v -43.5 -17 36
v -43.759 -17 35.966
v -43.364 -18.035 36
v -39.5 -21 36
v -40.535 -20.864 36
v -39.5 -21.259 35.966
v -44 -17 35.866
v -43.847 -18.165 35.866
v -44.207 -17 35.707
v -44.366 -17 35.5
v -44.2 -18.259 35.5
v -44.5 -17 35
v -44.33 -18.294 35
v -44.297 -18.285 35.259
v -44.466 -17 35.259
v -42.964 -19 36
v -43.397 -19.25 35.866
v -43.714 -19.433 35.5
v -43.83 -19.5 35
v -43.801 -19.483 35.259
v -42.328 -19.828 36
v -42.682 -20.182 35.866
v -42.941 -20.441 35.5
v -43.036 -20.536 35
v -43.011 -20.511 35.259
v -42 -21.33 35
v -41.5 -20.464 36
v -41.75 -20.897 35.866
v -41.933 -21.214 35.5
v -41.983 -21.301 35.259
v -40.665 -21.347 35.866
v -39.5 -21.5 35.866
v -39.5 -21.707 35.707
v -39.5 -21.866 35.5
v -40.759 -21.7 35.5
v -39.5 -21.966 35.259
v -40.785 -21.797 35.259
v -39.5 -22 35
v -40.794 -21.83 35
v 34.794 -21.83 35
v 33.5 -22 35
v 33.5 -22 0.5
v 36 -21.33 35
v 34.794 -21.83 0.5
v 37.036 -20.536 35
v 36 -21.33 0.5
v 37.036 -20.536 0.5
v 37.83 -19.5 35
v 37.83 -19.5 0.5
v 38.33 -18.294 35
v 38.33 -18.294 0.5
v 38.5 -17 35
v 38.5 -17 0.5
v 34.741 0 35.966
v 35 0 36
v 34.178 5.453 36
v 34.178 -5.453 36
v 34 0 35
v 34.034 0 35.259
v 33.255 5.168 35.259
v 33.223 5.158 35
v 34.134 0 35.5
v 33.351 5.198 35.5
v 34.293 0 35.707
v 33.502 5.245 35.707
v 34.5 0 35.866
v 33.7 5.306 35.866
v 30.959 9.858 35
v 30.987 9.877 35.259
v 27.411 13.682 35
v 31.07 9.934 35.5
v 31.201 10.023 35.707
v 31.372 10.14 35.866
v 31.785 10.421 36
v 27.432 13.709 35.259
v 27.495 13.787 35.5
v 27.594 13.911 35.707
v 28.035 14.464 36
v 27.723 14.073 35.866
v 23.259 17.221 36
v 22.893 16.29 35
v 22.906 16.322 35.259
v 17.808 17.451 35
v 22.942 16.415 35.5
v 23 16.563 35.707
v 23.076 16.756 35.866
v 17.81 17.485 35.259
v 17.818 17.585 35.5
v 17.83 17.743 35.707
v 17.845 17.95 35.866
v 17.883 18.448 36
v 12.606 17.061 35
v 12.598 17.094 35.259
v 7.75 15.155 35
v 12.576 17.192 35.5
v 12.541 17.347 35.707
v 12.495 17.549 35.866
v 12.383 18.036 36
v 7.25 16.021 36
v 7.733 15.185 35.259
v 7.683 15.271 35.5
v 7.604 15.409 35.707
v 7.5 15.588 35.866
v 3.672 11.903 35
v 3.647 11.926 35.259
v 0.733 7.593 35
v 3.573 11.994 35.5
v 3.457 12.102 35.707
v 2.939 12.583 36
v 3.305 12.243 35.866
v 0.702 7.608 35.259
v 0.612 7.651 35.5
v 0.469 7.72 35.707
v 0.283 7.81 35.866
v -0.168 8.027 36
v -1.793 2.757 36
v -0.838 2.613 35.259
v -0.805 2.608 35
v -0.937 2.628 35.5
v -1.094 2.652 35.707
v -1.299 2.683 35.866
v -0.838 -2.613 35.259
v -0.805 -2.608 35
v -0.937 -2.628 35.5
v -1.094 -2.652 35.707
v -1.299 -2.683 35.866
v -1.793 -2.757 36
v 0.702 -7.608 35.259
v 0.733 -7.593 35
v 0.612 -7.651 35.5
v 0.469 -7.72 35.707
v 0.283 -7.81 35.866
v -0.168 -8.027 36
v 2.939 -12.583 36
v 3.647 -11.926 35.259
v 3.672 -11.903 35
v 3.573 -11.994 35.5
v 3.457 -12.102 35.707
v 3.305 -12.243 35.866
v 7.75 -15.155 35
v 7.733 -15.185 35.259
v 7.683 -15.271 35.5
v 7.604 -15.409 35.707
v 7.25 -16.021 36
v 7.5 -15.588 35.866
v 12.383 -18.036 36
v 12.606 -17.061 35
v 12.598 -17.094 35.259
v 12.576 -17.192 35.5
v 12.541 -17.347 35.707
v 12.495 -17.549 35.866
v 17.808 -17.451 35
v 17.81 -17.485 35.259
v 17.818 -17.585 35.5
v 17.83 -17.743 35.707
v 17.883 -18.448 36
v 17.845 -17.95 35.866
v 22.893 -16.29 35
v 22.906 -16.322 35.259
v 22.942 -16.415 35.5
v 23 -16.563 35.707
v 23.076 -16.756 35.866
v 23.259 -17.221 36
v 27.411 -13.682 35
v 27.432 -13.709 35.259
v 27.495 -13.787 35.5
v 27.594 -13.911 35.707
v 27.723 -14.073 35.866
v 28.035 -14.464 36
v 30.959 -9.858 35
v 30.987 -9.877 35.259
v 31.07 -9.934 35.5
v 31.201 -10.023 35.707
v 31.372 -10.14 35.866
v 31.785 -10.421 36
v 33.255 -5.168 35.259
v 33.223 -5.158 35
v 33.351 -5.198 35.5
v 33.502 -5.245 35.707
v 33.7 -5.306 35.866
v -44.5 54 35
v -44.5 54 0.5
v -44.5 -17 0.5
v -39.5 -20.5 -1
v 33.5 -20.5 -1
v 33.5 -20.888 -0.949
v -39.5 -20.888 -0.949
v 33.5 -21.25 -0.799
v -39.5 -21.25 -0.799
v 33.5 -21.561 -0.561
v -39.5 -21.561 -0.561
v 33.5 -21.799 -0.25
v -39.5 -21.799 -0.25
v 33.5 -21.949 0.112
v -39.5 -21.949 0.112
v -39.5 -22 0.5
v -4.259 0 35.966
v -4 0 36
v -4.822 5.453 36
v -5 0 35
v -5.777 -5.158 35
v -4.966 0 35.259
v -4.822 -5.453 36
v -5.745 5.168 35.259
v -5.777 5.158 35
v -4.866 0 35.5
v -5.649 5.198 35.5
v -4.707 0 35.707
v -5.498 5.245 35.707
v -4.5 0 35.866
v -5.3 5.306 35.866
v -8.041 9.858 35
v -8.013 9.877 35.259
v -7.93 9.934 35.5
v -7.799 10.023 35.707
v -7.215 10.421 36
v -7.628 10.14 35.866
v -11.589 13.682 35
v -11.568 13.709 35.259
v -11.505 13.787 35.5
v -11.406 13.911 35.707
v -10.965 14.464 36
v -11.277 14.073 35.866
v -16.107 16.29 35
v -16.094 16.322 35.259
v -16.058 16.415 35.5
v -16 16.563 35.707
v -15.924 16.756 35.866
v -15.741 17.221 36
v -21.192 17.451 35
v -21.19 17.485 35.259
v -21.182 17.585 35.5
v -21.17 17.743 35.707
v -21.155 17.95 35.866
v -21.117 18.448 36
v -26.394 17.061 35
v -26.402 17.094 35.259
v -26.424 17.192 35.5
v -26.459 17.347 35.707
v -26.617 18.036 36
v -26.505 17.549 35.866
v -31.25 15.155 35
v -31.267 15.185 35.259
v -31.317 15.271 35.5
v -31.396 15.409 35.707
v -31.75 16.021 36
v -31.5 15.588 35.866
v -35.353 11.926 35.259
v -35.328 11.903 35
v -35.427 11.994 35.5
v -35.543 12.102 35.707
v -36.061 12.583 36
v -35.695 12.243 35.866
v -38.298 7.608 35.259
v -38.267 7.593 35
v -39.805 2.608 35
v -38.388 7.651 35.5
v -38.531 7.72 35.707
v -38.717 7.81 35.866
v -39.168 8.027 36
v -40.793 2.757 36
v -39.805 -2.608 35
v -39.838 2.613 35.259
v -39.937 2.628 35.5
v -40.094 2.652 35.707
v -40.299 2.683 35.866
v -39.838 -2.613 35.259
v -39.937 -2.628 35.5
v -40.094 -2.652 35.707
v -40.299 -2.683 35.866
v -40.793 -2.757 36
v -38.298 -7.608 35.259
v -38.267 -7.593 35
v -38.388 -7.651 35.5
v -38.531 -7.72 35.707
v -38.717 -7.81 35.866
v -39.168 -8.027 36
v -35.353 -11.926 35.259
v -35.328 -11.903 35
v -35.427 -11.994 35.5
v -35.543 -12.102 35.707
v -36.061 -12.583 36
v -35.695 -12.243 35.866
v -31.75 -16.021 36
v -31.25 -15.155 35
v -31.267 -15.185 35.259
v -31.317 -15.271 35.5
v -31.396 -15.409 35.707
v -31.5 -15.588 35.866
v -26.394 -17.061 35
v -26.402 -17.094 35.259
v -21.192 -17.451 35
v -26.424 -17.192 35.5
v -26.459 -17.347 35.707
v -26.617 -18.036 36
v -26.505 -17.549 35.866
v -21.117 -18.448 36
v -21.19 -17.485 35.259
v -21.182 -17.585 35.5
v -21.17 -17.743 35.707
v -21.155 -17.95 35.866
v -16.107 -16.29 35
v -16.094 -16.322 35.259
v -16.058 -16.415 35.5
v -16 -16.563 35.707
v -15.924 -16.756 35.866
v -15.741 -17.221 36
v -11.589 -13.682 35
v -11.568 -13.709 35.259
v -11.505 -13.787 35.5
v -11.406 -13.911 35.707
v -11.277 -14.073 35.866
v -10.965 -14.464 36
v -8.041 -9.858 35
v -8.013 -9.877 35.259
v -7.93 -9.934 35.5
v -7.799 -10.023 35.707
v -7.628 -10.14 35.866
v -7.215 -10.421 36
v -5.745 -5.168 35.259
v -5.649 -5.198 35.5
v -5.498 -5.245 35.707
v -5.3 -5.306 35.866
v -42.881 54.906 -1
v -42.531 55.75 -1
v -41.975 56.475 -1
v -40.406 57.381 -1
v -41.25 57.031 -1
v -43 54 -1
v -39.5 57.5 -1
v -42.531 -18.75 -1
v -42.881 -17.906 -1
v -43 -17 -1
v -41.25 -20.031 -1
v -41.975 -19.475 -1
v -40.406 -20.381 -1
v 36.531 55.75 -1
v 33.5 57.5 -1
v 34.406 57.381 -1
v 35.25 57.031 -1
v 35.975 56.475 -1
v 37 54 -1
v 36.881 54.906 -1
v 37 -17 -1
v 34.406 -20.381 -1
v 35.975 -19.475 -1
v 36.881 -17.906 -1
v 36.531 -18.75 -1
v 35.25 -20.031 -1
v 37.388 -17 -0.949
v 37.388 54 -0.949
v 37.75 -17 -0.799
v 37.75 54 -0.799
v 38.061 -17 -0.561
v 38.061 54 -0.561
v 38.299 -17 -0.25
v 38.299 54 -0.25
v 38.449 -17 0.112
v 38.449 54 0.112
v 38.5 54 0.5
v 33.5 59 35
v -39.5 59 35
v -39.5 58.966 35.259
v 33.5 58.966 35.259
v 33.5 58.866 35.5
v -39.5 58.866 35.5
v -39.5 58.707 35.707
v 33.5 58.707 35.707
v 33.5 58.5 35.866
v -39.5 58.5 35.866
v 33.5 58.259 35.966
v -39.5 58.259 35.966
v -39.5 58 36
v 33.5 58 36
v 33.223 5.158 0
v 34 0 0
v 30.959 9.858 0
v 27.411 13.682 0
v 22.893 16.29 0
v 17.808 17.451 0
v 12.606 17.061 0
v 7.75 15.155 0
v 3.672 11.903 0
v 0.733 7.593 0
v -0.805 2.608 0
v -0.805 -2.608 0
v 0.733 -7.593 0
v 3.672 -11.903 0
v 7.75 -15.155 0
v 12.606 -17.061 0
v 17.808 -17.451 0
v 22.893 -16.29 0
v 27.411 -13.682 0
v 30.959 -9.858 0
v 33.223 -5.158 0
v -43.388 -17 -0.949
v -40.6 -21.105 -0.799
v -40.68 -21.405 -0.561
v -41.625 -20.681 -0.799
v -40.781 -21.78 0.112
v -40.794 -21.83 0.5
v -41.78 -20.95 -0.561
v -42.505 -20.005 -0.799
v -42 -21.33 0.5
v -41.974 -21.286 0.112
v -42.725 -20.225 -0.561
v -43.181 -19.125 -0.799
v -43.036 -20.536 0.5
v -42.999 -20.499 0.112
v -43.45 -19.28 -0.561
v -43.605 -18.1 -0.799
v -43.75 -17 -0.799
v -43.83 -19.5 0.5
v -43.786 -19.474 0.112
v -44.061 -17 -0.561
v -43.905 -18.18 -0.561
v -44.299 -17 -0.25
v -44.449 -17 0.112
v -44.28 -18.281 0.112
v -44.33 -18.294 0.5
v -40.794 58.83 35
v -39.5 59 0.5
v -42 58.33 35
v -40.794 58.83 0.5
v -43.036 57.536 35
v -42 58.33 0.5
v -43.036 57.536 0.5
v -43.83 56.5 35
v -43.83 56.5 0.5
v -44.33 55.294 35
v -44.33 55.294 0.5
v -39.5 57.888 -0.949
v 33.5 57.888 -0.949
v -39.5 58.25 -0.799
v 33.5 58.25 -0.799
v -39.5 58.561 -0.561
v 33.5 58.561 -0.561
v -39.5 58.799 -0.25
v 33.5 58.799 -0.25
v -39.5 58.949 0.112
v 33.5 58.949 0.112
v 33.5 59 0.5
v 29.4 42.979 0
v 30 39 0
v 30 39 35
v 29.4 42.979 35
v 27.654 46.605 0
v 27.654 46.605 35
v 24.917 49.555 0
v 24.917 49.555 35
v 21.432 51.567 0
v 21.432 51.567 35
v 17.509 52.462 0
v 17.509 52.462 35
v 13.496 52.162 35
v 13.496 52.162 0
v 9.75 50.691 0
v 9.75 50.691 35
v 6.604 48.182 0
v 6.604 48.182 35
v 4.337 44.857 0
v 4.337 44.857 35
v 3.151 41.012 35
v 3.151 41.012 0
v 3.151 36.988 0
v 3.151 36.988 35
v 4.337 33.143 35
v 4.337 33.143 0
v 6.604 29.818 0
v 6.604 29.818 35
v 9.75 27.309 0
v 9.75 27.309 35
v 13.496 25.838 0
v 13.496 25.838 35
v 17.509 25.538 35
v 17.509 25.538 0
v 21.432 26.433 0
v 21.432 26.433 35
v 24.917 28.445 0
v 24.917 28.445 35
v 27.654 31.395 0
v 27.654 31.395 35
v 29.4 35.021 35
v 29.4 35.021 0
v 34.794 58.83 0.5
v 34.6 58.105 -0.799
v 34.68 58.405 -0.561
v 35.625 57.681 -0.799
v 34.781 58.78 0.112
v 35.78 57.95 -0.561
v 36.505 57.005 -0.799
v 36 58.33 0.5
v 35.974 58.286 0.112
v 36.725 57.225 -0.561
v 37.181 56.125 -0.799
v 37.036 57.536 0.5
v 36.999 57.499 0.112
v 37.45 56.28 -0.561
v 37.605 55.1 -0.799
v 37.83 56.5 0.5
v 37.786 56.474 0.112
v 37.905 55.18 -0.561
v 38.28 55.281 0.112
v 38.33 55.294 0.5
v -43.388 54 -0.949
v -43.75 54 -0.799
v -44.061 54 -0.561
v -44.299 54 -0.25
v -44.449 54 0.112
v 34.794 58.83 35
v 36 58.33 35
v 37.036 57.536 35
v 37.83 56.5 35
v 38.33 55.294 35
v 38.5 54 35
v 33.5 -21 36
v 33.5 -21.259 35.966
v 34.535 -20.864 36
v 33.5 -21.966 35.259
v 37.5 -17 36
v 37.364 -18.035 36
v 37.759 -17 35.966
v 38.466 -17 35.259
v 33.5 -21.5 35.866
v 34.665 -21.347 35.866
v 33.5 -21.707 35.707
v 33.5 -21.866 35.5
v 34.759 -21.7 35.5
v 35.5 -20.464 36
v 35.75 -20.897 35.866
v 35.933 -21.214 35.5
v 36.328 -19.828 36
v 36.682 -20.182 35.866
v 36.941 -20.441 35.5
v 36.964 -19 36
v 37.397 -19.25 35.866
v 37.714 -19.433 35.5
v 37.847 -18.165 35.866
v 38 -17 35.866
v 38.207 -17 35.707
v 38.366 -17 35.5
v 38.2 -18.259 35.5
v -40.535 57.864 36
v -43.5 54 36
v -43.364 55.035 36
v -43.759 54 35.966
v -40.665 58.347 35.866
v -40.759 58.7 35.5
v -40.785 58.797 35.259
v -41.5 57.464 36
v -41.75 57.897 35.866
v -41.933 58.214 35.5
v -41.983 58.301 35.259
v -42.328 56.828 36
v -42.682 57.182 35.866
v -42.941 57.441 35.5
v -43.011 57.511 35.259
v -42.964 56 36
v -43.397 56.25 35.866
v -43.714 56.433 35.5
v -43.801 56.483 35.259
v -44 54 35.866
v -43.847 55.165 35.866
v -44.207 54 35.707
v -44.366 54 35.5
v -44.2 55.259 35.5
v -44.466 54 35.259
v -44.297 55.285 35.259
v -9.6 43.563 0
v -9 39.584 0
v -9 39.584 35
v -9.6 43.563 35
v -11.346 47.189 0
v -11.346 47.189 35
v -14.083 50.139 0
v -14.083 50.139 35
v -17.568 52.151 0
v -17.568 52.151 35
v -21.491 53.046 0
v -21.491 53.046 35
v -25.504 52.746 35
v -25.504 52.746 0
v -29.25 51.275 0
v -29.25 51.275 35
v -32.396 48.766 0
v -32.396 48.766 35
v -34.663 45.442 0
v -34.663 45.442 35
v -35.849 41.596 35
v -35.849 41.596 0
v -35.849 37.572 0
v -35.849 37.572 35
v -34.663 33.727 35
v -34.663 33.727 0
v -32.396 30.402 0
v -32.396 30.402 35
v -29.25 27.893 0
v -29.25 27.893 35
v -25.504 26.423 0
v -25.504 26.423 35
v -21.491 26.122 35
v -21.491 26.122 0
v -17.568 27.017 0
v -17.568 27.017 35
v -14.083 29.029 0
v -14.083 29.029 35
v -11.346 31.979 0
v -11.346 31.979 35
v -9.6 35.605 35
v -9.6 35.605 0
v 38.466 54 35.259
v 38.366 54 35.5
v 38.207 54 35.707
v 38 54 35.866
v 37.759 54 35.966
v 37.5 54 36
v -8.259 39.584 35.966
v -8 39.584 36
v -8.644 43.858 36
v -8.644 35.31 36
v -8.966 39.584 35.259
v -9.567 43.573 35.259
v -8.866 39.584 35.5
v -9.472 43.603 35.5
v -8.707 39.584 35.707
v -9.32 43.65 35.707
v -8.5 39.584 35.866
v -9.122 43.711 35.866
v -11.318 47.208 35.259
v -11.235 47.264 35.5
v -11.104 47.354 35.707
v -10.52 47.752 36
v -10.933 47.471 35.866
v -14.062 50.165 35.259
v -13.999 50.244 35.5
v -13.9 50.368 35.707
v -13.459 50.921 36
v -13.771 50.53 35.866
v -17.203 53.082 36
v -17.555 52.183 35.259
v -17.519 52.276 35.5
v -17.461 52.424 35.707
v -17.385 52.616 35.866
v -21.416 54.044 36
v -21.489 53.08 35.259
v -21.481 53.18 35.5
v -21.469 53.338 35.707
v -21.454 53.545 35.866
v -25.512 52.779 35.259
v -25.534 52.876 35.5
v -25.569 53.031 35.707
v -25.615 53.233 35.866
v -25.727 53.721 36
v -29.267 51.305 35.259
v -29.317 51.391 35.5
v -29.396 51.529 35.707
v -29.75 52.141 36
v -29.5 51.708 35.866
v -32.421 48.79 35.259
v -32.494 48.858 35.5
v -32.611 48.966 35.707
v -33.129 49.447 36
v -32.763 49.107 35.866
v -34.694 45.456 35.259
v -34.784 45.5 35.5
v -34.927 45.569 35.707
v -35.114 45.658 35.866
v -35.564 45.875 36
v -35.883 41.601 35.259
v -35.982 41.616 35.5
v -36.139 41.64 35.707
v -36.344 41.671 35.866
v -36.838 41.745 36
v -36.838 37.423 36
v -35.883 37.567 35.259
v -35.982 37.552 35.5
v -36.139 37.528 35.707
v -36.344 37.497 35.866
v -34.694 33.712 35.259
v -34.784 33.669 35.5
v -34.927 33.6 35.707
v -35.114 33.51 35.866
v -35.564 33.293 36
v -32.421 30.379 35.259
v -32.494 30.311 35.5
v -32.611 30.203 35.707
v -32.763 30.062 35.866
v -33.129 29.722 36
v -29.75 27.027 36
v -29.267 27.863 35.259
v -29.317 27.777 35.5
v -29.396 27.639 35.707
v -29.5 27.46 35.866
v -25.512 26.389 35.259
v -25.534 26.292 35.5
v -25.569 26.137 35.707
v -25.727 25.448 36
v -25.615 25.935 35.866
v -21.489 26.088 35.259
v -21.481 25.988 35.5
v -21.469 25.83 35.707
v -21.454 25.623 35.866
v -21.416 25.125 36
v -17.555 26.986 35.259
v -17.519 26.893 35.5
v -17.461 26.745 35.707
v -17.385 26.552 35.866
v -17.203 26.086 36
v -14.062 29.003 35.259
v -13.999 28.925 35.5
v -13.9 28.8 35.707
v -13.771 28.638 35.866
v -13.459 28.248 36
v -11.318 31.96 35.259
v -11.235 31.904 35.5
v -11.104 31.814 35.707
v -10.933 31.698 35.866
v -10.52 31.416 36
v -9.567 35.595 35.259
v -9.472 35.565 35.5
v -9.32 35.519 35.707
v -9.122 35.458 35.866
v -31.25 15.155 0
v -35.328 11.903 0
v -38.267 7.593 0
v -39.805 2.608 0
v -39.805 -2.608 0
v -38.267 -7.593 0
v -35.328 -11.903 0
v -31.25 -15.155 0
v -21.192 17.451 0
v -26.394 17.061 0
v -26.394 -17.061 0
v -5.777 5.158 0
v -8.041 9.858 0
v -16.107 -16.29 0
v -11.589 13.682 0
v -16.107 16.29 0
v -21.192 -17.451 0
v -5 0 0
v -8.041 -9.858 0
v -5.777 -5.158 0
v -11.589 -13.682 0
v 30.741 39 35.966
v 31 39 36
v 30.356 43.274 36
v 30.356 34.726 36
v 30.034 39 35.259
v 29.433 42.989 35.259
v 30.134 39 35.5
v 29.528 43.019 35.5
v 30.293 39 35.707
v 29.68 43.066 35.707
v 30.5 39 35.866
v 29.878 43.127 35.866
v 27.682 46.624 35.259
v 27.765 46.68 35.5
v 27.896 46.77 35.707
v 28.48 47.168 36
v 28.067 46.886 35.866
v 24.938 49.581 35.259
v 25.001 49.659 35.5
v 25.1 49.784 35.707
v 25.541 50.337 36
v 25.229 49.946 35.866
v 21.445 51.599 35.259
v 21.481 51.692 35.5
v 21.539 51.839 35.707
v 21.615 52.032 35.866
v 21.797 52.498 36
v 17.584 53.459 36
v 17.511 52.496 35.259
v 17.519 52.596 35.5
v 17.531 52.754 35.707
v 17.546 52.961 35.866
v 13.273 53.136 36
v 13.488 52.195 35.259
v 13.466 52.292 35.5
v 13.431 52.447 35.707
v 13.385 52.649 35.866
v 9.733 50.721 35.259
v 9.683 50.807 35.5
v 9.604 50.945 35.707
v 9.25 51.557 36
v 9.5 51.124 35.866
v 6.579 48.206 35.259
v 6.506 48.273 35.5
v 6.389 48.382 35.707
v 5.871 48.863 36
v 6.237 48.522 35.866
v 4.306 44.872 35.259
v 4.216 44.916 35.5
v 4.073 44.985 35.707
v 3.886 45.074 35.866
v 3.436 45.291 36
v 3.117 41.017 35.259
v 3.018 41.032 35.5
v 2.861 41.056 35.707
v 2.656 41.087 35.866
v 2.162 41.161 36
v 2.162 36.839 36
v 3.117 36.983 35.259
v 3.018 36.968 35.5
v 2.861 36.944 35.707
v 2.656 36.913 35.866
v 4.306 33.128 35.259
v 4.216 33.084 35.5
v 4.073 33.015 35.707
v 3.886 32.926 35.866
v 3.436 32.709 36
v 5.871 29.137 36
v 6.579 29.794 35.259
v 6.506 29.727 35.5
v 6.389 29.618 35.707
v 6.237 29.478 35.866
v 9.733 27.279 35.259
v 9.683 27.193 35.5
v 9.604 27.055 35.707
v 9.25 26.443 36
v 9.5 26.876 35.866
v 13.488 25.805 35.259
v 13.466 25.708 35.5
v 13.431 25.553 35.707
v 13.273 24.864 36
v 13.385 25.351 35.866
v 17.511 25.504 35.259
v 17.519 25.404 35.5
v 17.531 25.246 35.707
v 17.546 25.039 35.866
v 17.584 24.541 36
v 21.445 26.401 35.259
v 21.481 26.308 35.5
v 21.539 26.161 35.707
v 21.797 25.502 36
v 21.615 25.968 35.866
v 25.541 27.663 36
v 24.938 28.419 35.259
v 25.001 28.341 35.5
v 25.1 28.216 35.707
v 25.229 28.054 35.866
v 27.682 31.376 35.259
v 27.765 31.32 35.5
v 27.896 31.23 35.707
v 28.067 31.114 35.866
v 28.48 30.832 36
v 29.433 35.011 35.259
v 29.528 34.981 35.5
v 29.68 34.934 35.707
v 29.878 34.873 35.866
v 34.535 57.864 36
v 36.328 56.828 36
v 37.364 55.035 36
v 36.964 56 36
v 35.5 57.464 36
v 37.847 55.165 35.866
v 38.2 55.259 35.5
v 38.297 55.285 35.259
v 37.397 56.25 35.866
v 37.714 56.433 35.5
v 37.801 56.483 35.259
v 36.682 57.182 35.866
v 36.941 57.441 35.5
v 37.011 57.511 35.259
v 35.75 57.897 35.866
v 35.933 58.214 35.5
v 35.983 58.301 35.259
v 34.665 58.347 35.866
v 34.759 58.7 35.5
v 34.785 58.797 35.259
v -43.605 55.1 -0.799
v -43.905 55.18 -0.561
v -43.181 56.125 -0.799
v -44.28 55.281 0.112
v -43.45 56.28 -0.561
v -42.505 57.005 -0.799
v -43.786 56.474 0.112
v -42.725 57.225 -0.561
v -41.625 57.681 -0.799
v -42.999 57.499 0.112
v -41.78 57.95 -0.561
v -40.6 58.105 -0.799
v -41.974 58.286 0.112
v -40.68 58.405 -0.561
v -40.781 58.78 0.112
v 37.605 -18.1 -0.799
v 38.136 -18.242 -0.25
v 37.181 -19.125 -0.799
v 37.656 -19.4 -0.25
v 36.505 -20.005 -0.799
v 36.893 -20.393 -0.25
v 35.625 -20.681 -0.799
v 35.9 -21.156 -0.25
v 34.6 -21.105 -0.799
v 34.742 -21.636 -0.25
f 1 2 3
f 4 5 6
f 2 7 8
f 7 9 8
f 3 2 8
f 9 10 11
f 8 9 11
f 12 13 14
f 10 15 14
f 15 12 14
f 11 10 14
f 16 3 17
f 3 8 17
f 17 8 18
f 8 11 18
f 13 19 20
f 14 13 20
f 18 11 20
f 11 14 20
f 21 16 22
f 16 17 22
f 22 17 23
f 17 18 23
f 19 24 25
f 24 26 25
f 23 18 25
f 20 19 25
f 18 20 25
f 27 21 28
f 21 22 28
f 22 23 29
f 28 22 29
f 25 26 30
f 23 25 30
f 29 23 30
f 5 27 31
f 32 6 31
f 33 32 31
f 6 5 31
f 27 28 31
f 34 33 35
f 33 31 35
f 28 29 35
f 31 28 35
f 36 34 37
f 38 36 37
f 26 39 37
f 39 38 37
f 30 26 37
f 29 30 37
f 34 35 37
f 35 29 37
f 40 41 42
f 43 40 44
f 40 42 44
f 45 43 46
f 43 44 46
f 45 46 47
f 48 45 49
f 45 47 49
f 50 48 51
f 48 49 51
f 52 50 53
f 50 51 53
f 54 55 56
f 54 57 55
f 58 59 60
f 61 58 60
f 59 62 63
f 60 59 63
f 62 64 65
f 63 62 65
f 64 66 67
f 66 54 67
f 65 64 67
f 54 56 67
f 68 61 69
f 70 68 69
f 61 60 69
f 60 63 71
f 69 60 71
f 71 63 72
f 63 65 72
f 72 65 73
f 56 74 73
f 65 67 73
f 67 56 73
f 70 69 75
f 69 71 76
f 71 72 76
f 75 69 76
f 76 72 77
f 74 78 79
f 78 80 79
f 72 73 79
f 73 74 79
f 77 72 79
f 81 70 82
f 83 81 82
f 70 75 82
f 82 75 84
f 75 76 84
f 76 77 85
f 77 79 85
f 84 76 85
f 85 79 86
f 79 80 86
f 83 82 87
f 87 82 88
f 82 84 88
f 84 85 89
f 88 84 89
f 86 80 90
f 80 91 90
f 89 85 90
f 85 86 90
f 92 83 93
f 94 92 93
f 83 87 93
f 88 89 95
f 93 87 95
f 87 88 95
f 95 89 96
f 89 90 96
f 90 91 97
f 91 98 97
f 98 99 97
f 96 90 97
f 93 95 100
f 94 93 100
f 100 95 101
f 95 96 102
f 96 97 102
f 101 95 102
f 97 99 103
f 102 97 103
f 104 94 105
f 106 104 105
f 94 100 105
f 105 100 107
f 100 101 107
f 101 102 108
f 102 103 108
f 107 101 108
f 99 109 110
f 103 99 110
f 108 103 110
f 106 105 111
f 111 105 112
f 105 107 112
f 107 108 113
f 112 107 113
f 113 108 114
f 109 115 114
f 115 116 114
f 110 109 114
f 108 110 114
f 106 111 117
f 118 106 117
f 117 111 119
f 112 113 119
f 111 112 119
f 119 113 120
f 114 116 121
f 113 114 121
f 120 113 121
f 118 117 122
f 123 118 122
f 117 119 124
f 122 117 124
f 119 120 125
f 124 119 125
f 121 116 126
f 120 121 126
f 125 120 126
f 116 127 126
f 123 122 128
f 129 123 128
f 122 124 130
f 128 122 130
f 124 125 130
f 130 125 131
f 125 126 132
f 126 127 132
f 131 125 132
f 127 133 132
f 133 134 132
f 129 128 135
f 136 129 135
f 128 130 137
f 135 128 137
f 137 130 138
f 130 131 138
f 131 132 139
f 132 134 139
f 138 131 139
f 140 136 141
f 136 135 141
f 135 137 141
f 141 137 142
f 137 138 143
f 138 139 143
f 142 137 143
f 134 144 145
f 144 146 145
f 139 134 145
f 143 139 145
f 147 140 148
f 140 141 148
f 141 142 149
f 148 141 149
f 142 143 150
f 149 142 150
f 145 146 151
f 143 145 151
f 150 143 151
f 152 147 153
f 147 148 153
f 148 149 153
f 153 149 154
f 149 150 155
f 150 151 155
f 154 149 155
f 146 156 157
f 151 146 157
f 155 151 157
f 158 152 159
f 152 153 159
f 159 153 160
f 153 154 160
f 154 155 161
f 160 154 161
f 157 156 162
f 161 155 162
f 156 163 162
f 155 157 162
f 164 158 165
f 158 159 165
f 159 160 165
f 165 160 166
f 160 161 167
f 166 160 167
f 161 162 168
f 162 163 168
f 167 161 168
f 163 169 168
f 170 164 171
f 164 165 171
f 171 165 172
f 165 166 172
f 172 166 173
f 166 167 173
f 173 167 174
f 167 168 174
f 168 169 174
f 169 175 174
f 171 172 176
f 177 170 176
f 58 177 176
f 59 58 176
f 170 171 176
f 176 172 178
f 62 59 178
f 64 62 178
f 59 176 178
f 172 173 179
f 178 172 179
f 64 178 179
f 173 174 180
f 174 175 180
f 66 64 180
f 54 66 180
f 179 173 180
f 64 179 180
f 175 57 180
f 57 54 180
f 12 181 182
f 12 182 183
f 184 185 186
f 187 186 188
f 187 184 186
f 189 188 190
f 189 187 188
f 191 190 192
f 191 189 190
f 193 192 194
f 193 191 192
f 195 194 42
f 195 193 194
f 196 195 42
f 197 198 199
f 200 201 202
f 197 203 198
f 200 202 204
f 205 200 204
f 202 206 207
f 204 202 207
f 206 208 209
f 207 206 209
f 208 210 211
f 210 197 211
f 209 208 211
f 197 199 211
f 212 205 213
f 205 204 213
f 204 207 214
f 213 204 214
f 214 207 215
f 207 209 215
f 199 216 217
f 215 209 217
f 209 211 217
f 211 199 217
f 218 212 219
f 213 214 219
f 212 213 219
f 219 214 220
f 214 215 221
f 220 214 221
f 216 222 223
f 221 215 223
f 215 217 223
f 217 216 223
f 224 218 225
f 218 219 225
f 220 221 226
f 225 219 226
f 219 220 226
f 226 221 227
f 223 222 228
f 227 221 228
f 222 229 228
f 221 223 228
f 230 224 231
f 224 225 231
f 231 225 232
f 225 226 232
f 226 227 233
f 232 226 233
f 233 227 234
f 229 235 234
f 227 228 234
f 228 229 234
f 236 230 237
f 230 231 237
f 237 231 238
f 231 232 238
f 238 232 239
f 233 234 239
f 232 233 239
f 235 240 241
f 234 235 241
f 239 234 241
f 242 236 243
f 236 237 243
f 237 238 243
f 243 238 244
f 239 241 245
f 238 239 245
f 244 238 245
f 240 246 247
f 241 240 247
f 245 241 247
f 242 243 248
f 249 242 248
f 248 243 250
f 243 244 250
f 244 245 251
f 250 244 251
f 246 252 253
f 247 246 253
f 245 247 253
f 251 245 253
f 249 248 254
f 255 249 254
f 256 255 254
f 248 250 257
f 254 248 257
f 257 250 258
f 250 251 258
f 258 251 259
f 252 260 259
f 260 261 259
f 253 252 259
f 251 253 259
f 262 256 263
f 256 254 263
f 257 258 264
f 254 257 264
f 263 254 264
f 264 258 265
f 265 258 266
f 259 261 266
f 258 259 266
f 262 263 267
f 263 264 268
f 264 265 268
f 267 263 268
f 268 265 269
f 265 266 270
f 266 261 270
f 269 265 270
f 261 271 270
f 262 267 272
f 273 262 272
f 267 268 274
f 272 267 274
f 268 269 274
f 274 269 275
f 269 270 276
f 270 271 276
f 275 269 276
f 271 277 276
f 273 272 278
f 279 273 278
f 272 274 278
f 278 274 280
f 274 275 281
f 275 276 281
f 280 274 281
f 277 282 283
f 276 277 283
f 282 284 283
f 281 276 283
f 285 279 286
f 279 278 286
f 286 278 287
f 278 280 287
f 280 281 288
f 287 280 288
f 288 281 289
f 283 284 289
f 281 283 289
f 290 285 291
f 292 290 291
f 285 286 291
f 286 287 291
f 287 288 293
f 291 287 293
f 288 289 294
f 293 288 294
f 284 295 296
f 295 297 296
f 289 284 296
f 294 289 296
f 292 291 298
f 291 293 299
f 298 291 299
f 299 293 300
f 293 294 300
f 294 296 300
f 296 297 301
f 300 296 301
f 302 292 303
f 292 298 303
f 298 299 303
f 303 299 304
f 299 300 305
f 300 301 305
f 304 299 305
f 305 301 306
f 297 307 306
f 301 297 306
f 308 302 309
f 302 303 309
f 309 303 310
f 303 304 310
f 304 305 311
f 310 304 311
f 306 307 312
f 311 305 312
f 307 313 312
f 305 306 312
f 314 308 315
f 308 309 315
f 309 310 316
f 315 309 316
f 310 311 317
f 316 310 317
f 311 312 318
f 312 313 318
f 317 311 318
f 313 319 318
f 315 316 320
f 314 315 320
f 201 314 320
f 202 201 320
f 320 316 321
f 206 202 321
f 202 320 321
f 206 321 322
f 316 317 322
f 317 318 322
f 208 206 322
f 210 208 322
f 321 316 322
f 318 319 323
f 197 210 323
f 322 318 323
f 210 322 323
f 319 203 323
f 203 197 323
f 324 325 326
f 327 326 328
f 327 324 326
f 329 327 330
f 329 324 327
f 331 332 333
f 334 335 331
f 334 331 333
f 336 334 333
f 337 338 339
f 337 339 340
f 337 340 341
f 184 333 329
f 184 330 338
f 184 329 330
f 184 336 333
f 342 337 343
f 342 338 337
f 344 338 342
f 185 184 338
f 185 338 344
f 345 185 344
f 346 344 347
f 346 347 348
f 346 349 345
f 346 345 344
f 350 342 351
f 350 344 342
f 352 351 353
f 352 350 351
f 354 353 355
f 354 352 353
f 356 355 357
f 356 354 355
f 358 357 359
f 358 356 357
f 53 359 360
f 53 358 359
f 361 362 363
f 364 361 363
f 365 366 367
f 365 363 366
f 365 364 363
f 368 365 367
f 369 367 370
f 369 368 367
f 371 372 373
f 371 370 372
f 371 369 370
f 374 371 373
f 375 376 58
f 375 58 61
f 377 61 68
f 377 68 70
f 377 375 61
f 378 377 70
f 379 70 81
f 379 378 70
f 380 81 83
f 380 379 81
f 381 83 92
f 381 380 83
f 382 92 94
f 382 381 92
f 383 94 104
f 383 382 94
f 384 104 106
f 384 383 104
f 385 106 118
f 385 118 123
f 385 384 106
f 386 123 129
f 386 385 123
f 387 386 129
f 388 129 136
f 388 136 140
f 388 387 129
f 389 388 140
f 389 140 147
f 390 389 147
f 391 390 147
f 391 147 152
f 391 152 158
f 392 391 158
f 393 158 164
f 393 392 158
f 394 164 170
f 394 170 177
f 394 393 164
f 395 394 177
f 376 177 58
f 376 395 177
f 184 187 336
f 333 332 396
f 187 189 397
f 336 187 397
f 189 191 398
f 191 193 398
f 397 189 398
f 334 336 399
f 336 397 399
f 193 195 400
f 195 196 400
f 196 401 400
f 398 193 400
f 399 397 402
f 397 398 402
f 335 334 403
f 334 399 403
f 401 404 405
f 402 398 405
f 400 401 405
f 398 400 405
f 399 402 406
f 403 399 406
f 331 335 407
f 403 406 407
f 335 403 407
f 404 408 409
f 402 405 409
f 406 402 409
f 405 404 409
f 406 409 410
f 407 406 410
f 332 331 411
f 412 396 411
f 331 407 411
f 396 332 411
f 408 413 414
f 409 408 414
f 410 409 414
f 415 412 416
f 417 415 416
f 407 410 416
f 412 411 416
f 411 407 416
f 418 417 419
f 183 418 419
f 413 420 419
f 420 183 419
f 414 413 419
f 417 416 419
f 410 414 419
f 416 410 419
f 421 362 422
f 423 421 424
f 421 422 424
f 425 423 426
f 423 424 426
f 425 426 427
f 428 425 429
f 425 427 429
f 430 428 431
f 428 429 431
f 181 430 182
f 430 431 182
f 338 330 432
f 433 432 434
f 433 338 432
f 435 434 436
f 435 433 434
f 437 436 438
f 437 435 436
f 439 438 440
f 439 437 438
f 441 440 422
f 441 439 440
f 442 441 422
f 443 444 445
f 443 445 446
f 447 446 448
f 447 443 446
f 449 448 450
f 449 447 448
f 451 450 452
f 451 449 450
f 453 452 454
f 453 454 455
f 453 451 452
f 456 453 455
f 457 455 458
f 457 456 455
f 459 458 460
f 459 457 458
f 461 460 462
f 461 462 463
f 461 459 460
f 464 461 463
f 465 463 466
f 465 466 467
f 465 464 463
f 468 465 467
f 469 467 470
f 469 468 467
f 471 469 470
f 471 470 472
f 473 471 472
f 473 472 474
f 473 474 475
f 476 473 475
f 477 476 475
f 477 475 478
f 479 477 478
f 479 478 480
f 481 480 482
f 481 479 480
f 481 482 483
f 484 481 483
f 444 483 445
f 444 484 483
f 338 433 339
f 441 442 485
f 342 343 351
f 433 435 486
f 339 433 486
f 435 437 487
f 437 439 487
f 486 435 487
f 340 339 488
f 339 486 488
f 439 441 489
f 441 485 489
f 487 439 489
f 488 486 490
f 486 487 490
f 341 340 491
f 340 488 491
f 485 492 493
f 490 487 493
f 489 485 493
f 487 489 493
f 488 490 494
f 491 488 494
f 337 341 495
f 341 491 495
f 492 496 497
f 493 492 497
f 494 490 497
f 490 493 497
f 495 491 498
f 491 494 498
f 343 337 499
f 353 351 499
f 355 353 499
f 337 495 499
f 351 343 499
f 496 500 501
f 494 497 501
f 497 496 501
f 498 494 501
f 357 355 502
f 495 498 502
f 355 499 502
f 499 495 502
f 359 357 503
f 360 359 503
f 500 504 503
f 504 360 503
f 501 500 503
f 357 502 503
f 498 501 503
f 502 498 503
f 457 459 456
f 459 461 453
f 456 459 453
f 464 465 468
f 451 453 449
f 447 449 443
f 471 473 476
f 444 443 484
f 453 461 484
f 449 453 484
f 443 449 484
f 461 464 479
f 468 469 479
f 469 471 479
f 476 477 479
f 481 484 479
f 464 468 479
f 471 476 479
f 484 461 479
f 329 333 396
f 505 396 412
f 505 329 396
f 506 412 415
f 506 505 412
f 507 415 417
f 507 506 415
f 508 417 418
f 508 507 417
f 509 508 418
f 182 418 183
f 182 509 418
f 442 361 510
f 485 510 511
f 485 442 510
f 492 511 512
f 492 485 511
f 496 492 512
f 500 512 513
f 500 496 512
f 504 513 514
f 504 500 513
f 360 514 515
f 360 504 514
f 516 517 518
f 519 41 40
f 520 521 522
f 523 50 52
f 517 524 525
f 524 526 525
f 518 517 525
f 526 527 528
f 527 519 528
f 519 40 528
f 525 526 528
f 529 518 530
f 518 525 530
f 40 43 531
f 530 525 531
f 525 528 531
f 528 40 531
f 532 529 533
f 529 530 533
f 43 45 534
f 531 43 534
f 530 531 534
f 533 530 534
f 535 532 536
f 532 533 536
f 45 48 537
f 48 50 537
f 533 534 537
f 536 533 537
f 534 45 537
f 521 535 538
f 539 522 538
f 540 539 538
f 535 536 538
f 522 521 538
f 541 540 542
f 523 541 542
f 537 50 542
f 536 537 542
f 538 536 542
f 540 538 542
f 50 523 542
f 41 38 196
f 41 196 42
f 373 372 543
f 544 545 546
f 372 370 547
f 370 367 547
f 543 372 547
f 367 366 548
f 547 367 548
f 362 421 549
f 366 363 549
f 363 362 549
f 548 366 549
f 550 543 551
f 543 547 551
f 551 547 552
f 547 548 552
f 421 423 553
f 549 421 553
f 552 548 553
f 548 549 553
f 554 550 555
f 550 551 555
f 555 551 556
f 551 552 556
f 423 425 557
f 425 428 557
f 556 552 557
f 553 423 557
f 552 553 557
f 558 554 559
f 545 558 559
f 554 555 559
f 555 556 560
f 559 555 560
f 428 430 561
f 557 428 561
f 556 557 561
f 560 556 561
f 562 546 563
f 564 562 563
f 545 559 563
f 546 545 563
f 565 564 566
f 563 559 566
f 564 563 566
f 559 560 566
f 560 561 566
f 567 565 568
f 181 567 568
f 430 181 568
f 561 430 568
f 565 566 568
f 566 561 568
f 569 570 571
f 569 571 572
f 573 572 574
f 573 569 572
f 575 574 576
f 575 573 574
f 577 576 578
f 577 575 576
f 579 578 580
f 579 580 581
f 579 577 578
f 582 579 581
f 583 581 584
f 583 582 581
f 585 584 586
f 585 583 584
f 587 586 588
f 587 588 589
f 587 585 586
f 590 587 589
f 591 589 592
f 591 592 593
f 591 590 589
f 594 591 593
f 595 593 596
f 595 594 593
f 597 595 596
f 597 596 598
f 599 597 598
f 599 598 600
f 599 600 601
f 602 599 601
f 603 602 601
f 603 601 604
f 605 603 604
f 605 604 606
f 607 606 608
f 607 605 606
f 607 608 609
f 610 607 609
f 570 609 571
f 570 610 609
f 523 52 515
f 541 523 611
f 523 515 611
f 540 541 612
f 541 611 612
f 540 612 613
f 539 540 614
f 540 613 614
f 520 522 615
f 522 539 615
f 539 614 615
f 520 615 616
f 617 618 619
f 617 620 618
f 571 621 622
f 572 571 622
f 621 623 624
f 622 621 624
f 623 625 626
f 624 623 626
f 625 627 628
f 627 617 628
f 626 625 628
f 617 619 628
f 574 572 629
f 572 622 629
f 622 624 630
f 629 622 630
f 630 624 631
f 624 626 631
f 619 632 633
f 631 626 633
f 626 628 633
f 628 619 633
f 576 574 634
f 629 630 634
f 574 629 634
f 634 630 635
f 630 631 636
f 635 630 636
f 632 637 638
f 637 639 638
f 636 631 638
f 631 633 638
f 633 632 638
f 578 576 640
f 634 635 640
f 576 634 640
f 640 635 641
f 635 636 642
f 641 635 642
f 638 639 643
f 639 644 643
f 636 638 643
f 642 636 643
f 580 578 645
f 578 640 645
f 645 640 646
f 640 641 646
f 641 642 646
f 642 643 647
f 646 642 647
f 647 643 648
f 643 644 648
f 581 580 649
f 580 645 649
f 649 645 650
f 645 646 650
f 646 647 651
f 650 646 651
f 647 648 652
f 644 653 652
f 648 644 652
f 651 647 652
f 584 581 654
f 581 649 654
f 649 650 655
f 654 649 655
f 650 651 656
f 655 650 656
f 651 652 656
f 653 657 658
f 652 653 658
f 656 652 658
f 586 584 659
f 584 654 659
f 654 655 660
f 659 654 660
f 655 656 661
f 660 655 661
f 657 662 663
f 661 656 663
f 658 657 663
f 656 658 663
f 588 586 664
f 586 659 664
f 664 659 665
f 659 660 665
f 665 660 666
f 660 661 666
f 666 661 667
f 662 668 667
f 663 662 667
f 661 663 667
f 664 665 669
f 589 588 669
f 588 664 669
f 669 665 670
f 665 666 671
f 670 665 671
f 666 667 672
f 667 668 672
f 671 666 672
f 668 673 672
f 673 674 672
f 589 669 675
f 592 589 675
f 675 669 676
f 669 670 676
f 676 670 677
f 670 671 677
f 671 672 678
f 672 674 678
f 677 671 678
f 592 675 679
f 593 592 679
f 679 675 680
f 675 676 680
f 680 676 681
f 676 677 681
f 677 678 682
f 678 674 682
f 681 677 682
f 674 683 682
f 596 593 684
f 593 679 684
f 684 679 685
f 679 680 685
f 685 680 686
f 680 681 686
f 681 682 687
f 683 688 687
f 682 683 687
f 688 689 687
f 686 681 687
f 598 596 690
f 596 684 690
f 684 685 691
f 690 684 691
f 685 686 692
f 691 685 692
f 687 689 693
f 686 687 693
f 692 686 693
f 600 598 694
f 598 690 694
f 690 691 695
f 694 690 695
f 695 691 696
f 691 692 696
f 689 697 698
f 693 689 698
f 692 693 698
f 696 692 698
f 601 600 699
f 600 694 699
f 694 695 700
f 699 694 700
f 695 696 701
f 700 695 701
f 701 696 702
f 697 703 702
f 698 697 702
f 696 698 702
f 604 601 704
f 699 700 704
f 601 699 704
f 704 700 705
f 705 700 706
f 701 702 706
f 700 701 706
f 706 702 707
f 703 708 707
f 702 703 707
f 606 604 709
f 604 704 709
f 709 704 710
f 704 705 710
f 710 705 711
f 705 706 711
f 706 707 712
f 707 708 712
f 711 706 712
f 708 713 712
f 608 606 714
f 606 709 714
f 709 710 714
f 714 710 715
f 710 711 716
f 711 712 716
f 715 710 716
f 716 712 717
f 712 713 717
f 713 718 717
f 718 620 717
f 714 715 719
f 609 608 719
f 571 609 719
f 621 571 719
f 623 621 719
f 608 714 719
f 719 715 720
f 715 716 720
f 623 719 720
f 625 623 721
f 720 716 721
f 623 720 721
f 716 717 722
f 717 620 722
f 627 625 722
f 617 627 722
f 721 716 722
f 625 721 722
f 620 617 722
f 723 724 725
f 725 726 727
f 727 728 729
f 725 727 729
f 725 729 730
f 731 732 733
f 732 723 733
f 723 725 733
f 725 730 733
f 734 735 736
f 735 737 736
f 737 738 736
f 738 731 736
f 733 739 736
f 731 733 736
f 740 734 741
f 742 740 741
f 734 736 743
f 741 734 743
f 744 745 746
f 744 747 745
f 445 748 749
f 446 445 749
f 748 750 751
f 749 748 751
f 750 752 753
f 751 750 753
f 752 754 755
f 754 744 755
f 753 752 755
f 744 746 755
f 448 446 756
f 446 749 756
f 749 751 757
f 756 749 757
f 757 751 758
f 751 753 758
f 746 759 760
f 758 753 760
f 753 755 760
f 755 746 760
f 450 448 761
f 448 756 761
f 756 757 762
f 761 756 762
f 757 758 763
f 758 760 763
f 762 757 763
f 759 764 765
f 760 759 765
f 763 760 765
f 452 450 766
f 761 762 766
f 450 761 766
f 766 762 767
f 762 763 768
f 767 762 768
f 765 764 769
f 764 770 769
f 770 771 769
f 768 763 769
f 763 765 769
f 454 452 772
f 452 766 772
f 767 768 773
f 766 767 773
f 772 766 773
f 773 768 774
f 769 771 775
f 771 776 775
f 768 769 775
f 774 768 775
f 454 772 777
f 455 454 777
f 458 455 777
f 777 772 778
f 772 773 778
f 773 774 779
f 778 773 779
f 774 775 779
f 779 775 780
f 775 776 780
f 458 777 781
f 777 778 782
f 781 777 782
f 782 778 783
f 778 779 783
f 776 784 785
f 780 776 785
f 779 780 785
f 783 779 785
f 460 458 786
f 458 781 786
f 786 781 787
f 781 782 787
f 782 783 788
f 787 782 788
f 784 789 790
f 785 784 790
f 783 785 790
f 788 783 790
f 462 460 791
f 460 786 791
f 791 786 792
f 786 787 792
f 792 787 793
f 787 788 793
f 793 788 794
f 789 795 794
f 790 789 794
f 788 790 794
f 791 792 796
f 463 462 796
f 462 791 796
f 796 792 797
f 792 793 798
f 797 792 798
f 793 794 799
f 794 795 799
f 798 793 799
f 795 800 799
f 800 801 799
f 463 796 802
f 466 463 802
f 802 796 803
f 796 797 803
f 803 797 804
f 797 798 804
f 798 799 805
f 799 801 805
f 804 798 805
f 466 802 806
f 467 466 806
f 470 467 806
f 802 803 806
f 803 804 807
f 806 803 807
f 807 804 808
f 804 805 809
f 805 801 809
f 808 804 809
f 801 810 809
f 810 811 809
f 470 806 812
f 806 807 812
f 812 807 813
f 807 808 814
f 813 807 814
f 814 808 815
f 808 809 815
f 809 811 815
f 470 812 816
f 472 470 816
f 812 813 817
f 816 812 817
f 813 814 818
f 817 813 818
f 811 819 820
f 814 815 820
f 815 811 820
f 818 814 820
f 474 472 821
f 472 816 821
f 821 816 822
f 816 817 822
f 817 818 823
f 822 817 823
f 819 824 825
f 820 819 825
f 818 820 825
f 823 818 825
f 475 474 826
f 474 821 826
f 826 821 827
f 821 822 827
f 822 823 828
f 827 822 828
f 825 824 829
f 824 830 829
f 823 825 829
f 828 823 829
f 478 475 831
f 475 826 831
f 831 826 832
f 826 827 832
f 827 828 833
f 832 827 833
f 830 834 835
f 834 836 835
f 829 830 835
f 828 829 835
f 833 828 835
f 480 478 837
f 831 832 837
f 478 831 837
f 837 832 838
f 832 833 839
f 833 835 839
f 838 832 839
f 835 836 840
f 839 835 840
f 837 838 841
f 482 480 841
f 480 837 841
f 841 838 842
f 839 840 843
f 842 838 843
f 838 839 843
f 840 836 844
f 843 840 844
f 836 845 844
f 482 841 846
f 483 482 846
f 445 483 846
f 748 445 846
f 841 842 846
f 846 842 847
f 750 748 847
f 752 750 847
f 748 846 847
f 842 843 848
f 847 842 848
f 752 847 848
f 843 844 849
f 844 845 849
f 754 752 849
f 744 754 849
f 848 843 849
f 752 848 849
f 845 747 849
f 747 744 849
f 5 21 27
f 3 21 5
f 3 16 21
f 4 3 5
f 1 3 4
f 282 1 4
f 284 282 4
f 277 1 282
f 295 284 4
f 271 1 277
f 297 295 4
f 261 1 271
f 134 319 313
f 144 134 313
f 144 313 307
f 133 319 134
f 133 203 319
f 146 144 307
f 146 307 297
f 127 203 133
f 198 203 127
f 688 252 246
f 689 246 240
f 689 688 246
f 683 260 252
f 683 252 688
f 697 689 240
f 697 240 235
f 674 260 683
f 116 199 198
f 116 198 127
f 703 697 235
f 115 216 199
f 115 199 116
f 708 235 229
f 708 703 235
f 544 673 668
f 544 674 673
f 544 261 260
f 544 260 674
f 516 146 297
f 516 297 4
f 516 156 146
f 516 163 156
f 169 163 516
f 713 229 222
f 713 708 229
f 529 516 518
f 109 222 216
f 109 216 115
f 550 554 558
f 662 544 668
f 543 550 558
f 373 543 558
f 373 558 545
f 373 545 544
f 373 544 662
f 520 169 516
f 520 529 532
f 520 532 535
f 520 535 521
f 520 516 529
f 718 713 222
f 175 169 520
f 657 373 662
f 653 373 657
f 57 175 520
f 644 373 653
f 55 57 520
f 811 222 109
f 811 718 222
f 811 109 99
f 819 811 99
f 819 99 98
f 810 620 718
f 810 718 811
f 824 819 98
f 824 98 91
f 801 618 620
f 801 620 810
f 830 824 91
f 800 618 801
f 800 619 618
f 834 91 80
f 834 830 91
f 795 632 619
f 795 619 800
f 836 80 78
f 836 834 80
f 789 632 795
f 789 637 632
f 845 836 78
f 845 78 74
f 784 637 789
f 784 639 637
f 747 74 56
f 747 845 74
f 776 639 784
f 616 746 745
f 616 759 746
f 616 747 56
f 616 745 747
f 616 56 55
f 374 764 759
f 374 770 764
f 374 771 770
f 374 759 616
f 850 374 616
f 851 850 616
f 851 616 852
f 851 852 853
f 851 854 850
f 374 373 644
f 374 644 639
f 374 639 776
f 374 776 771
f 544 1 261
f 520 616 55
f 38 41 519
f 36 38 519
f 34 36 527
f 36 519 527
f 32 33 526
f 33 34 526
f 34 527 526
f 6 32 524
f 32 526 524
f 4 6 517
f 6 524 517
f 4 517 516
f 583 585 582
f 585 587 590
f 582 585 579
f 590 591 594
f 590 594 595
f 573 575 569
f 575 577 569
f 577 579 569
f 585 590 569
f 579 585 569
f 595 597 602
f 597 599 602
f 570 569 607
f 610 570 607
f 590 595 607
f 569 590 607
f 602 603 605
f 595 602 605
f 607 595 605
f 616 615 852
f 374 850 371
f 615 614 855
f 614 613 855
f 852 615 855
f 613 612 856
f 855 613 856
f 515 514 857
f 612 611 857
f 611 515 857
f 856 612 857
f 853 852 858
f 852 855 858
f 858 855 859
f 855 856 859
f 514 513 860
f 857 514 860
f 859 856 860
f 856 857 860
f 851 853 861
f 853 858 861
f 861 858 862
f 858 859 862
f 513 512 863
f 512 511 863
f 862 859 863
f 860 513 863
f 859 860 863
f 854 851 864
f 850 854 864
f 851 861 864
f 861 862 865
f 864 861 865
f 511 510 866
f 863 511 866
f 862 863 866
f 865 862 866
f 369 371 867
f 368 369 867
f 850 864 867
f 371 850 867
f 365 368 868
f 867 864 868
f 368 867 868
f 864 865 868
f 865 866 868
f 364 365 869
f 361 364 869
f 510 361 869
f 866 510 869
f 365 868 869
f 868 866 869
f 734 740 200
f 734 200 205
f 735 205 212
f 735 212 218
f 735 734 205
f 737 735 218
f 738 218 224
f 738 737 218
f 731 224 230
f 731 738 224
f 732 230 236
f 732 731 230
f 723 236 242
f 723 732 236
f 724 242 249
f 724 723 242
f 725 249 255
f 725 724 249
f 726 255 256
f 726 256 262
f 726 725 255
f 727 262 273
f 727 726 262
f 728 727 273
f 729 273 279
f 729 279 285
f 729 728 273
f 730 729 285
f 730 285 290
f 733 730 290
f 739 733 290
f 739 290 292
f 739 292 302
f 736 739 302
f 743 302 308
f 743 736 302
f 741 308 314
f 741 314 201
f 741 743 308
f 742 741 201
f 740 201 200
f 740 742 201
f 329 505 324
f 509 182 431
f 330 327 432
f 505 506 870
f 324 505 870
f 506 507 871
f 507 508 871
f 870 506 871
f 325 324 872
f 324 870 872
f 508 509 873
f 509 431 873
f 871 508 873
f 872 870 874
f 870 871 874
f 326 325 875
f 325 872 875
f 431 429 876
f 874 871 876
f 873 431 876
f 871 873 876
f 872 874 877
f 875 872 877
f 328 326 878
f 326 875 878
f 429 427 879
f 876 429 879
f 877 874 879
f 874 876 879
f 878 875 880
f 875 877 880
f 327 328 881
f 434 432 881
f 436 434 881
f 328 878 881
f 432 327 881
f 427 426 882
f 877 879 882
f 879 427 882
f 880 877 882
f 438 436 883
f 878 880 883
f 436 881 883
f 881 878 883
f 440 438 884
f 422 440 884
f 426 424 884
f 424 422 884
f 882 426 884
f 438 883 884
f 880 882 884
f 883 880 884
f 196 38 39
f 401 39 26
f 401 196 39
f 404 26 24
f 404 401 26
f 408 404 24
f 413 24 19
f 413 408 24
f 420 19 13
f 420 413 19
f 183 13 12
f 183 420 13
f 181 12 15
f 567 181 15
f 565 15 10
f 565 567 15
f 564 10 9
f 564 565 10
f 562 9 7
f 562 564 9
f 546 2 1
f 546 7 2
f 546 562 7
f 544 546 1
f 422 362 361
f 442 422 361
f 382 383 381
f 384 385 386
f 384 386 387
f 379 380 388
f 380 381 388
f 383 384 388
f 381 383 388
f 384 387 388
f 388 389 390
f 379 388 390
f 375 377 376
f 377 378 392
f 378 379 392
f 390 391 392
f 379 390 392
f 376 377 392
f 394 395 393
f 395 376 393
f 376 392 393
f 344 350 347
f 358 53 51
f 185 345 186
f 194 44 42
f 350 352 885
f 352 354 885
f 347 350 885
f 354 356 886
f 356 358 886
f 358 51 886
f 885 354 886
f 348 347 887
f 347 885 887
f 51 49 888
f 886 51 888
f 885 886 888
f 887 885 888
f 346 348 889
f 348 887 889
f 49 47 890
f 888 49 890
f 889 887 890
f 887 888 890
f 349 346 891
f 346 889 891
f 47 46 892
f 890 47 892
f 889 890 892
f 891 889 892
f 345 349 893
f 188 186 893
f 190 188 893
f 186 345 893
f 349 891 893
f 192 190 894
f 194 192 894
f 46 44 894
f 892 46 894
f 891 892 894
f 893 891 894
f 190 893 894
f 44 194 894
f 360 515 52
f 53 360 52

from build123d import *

# Parameters (mm, degrees)
F0_W         = 83
F0_H         = 81
F0_R         = 17.5
F0_R_2       = 13.5
F1_DEPTH     = 36
F2_R         = 1
F3_W         = 83
F3_H         = 81
F4_DEPTH     = 1
F5_T1_DEPTH  = 49.5
F5_T4_ANGLE  = 90
F5_T6_ANGLE  = 90
F5_T8_ANGLE  = 90
F5_T10_ANGLE = 90
F6_R         = 1.5


# Not quite as in the source:
# - a fillet or chamfer that OpenCascade refuses, or shapes differently, is made with other operations: its cross-section is extruded or revolved along the edge and cut away or added
# - a feature names something its author has since deleted; it is built from what else it names


with BuildPart() as f1:
    # F0 (on Top) → F1 (new body)
    with BuildSketch(Plane.XY):
        with Locations((-3, 18.5)):
            Rectangle(F0_W, F0_H)
        with Locations((-22.5, 0)):
            Circle(F0_R, mode=Mode.SUBTRACT)
        with Locations((16.5, 0)):
            Circle(F0_R, mode=Mode.SUBTRACT)
        with Locations((-22.5, 39.5840890706)):
            Circle(F0_R_2, mode=Mode.SUBTRACT)
        with Locations((16.5, 39)):
            Circle(F0_R_2, mode=Mode.SUBTRACT)
    extrude(amount=F1_DEPTH)

    # F2
    f2_edges = [f1.edges().sort_by_distance(p)[0] for p in [
        (-3, 59, 36),
        (-44.5, 18.5, 36),
        (-3, -22, 36),
        (38.5, 18.5, 36),
        (-40, 0, 36),
        (-1, 0, 36),
        (-36, 39.584089, 36),
        (3, 39, 36),
    ]]
    fillet(f2_edges, radius=F2_R)

    # F3 (on face) → F4 (join)
    with BuildSketch(Plane(origin=(0, 0, 0), x_dir=(1, 0, 0), z_dir=(0, 0, -1))):
        with Locations((-3, -18.5)):
            Rectangle(F3_W, F3_H)
    extrude(amount=F4_DEPTH)

    # F5: fillet of radius 5 on 4 edges, made by hand

    # F5_s2 → F5_t1 (cut)
    with BuildSketch(Plane.XY.offset(-13.5)):
        with BuildLine():
            ThreePointArc((-39.5, 59), (-43.0355339059, 57.5355339059), (-44.5, 54))
            Line((-44.5, 54), (-44.5, 59))
            Line((-44.5, 59), (-39.5, 59))
        make_face()
        with BuildLine():
            ThreePointArc((-39.5, -22), (-43.0355339059, -20.5355339059), (-44.5, -17))
            Line((-44.5, -17), (-44.5, -22))
            Line((-44.5, -22), (-39.5, -22))
        make_face()
        with BuildLine():
            ThreePointArc((33.5, -22), (37.0355339059, -20.5355339059), (38.5, -17))
            Line((38.5, -17), (38.5, -22))
            Line((38.5, -22), (33.5, -22))
        make_face()
        with BuildLine():
            ThreePointArc((33.5, 59), (37.0355339059, 57.5355339059), (38.5, 54))
            Line((38.5, 54), (38.5, 59))
            Line((38.5, 59), (33.5, 59))
        make_face()
    extrude(amount=F5_T1_DEPTH, mode=Mode.SUBTRACT)

    # F5_s3 → F5_t4 (revolve, cut)
    with BuildSketch(Plane.XZ.offset(-54)):
        with BuildLine():
            ThreePointArc((37.5, 36), (38.2071067812, 35.7071067812), (38.5, 35))
            Line((38.5, 35), (38.5, 36))
            Line((38.5, 36), (37.5, 36))
        make_face()
    revolve(axis=Axis((33.5, 54, 36), (0, 0, 1)), revolution_arc=F5_T4_ANGLE, mode=Mode.SUBTRACT)

    # F5_s5 → F5_t6 (revolve, cut)
    with BuildSketch(Plane.YZ.offset(33.5)):
        with BuildLine():
            ThreePointArc((-21, 36), (-21.7071067812, 35.7071067812), (-22, 35))
            Line((-22, 35), (-22, 36))
            Line((-22, 36), (-21, 36))
        make_face()
    revolve(axis=Axis((33.5, -17, 36), (0, 0, 1)), revolution_arc=F5_T6_ANGLE, mode=Mode.SUBTRACT)

    # F5_s7 → F5_t8 (revolve, cut)
    with BuildSketch(Plane.XZ.offset(17)):
        with BuildLine():
            ThreePointArc((-43.5, 36), (-44.2071067812, 35.7071067812), (-44.5, 35))
            Line((-44.5, 35), (-44.5, 36))
            Line((-44.5, 36), (-43.5, 36))
        make_face()
    revolve(axis=Axis((-39.5, -17, 36), (0, 0, 1)), revolution_arc=F5_T8_ANGLE, mode=Mode.SUBTRACT)

    # F5_s9 → F5_t10 (revolve, cut)
    with BuildSketch(Plane.YZ.offset(-39.5)):
        with BuildLine():
            ThreePointArc((58, 36), (58.7071067812, 35.7071067812), (59, 35))
            Line((59, 35), (59, 36))
            Line((59, 36), (58, 36))
        make_face()
    revolve(axis=Axis((-39.5, 54, 36), (0, 0, 1)), revolution_arc=F5_T10_ANGLE, mode=Mode.SUBTRACT)

    # F6
    f6_edges = [f1.edges().sort_by_distance(p)[0] for p in [
        (37.035534, -20.535534, -1),
        (38.5, 18.5, -1),
        (37.035534, 57.535534, -1),
        (-3, 59, -1),
        (-43.035534, 57.535534, -1),
        (-44.5, 18.5, -1),
        (-43.035534, -20.535534, -1),
        (-3, -22, -1),
    ]]
    fillet(f6_edges, radius=F6_R)


solid = f1.part
